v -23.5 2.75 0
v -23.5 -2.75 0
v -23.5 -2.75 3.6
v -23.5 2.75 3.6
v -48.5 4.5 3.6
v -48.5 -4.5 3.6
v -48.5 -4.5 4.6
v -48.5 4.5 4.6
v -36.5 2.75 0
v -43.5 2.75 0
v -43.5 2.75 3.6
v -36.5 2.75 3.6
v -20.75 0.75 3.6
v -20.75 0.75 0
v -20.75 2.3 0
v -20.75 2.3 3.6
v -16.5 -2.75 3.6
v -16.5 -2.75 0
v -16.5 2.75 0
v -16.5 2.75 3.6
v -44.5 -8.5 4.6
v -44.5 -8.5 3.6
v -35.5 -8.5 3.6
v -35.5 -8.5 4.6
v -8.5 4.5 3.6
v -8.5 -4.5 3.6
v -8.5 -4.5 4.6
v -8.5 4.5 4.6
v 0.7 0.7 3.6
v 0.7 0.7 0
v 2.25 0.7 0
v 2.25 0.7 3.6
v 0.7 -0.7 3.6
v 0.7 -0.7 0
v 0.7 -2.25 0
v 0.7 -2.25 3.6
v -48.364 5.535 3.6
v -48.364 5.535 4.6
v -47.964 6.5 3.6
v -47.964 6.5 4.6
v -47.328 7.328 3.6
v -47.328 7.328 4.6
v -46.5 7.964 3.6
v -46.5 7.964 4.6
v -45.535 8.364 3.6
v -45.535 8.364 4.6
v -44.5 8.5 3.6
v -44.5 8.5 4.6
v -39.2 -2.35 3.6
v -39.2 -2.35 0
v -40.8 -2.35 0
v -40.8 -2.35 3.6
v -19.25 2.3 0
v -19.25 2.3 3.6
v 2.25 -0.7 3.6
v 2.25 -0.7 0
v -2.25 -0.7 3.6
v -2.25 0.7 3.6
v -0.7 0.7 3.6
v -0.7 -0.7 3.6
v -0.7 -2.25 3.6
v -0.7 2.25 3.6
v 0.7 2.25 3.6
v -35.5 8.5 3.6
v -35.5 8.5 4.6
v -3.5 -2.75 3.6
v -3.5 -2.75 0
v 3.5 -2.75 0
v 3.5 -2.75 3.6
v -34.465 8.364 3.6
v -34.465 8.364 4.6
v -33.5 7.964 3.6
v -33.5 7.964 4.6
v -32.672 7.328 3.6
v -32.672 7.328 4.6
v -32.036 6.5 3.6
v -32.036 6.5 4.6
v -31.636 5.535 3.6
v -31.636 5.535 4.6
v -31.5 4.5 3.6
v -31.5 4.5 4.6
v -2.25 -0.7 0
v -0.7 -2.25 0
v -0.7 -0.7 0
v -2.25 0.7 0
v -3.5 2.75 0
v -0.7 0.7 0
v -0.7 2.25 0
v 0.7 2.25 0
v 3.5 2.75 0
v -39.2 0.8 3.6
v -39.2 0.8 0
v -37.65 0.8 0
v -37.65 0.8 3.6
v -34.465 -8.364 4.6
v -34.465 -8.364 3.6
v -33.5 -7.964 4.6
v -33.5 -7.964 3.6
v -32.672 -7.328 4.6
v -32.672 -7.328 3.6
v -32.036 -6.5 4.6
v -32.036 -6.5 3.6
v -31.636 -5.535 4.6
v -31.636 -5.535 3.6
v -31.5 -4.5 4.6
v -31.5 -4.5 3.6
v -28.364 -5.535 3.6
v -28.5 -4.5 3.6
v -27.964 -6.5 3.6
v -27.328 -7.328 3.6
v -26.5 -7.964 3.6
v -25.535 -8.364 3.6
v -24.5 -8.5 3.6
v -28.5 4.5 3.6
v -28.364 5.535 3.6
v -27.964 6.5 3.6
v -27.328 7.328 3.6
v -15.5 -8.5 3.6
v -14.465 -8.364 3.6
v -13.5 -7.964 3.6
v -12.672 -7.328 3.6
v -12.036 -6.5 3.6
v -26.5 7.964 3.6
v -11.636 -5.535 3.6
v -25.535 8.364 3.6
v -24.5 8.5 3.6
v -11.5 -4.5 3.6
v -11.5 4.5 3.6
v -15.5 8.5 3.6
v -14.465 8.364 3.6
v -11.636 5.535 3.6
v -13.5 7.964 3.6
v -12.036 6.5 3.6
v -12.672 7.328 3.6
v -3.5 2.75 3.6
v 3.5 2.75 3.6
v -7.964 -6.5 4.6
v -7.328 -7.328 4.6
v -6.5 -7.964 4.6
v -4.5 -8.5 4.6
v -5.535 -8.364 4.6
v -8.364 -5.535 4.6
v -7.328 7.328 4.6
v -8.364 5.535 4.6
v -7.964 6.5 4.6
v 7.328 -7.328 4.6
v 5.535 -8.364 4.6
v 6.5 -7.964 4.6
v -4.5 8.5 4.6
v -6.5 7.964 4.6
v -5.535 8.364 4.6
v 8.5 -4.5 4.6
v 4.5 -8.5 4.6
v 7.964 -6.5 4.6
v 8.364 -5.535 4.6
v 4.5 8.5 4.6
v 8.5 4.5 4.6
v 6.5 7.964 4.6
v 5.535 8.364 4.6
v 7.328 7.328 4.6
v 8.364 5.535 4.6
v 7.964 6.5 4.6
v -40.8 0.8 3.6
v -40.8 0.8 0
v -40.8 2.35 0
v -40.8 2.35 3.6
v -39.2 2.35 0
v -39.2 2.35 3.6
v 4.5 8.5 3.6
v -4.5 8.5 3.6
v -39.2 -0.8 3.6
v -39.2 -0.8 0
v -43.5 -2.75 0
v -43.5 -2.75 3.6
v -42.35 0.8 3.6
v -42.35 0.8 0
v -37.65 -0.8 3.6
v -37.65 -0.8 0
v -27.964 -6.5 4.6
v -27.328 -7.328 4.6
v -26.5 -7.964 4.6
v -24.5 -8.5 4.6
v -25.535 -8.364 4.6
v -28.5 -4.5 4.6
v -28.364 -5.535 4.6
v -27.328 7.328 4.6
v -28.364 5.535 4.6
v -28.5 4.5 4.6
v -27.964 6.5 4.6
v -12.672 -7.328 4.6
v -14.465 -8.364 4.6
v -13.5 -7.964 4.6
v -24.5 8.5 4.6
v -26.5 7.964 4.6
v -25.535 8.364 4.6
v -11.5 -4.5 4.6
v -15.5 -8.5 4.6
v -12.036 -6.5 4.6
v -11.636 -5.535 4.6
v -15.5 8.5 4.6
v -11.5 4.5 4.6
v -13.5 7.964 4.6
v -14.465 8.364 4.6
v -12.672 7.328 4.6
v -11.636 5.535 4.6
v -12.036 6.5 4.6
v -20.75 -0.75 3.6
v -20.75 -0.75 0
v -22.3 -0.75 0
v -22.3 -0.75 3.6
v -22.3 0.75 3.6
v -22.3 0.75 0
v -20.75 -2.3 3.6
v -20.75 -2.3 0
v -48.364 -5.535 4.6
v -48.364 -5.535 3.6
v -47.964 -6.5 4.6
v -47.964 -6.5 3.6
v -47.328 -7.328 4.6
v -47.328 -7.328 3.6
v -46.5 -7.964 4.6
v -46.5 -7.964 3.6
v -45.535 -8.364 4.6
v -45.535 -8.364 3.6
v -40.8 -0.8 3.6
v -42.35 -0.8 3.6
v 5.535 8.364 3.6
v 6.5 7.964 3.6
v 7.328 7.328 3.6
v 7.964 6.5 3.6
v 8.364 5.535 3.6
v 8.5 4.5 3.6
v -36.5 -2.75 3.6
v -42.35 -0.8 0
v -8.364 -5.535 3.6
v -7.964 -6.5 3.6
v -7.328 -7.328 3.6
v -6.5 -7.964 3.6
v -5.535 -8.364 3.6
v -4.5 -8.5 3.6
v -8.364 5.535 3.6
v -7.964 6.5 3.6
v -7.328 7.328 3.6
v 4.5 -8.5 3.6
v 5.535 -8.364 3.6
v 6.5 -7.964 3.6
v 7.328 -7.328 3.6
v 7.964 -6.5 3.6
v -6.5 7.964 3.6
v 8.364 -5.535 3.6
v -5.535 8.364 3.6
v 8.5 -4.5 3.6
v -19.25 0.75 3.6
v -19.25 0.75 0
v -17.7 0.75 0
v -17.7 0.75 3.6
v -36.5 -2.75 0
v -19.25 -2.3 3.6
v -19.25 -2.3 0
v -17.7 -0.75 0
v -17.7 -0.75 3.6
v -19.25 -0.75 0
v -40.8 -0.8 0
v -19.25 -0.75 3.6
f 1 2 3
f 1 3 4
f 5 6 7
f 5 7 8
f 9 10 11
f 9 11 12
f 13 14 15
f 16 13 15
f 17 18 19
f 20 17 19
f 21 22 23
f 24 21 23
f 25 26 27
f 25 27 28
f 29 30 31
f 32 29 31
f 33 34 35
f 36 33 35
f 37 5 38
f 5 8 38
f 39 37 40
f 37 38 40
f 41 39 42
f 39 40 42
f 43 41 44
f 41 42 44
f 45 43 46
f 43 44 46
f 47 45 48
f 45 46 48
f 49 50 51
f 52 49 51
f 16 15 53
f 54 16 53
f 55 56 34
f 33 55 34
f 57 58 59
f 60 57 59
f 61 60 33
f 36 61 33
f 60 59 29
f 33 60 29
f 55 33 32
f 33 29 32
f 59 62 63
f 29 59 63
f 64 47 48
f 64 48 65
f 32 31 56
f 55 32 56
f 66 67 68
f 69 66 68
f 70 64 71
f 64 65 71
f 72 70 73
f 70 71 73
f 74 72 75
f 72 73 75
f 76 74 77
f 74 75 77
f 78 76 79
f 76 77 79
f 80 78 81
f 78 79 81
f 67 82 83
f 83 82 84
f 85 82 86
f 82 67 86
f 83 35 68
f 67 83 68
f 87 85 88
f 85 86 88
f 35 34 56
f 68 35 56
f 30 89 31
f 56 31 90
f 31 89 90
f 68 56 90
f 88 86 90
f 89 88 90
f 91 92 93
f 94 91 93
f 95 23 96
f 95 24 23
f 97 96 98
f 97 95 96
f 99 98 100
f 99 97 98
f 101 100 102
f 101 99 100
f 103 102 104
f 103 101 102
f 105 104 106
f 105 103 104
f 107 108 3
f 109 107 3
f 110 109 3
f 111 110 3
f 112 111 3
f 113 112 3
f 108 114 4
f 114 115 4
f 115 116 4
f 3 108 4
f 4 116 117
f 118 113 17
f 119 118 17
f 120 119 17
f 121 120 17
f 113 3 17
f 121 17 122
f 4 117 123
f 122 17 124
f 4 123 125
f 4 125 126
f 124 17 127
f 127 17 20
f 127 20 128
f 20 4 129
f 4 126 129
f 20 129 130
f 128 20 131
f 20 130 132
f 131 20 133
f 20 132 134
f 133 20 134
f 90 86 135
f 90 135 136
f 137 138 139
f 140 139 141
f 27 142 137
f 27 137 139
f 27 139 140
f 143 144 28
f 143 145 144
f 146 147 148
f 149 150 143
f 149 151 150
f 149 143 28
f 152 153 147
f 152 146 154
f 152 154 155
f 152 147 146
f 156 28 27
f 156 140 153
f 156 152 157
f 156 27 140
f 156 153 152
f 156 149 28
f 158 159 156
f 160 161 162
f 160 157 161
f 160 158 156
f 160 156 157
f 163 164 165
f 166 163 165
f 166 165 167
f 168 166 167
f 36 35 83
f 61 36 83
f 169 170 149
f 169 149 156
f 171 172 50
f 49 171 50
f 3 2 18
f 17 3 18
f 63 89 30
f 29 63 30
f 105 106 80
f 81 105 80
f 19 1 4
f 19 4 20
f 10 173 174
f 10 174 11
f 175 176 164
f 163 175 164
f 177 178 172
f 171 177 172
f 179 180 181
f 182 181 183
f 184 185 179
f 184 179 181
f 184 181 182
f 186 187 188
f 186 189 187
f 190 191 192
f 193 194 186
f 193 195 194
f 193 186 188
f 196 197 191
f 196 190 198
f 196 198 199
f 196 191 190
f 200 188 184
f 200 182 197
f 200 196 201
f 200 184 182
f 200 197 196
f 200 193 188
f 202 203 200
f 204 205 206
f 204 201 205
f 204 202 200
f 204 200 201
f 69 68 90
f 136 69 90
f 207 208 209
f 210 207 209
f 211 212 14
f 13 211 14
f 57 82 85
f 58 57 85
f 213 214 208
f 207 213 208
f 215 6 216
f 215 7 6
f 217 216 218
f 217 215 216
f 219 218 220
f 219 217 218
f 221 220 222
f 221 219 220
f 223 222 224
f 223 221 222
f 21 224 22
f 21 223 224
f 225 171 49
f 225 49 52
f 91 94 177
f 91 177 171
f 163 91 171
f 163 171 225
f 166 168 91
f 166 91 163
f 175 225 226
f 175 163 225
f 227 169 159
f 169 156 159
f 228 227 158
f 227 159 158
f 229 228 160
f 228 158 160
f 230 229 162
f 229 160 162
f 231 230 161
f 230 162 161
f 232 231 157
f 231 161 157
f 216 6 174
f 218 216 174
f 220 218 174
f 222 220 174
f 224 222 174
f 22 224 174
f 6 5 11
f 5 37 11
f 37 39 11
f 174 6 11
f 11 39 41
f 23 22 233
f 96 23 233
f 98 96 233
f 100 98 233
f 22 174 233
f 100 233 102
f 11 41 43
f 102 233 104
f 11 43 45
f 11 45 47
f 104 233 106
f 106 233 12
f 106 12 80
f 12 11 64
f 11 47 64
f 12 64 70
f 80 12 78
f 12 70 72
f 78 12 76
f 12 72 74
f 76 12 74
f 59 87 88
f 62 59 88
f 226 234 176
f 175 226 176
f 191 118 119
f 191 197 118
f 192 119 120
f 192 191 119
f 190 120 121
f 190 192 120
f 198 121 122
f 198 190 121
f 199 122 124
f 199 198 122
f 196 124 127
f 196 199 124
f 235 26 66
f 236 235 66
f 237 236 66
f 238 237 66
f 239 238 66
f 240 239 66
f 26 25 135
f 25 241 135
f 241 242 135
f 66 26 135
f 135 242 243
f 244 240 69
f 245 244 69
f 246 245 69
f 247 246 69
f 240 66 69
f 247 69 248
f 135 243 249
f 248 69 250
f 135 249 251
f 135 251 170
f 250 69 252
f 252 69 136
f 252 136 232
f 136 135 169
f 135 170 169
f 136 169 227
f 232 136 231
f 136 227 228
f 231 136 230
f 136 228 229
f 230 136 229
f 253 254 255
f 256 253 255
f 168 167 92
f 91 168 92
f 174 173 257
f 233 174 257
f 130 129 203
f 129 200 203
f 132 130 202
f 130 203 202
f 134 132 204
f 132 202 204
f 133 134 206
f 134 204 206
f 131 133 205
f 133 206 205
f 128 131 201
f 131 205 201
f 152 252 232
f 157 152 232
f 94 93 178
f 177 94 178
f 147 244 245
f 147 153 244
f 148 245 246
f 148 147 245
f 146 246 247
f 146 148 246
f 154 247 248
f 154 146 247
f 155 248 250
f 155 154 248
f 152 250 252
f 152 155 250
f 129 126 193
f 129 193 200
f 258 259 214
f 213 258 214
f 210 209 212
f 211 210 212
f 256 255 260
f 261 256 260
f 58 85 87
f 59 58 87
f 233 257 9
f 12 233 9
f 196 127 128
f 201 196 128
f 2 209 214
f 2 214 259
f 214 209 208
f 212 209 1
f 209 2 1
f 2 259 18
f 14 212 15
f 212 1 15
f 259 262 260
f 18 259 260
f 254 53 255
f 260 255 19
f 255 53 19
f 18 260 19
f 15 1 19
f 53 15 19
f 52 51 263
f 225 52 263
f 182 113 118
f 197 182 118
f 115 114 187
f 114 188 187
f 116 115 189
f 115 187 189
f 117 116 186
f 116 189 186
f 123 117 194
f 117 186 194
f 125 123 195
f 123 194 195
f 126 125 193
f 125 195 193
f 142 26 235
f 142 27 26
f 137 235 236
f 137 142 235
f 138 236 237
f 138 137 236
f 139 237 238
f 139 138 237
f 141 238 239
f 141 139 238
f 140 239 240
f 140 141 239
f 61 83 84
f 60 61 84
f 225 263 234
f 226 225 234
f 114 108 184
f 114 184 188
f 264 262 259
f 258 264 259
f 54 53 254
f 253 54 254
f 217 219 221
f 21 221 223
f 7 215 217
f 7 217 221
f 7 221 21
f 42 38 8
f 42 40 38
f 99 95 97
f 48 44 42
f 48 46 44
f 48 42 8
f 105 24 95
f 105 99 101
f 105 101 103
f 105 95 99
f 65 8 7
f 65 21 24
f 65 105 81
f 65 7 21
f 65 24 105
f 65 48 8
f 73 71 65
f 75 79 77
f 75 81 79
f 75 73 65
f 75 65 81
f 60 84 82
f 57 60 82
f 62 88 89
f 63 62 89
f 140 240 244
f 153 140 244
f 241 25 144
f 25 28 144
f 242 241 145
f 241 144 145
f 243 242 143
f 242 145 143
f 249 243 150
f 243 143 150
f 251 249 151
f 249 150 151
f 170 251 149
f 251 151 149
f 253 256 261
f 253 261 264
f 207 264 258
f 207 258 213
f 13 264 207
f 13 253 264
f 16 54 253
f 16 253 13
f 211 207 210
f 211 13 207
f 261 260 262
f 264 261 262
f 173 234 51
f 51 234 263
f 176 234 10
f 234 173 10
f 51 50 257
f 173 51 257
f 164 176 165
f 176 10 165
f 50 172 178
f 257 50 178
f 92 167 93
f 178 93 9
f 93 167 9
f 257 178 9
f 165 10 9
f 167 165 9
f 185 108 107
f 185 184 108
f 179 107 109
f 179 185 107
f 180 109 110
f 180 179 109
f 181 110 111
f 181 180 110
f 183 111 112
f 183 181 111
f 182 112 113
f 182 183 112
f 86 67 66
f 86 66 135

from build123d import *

# Parameters (mm, degrees)
SKICA1_W                 = 7
SKICA1_H                 = 5.5
P_IDAT_VYSUNUT_M1_DEPTH  = 3.6
SKICA2_W                 = 17
SKICA2_H                 = 17
P_IDAT_VYSUNUT_M2_DEPTH  = 1
ZAOBLIT1_R               = 4
LINPOLE1_COUNT           = 3
LINPOLE1_PITCH           = 20
ODEBRAT_VYSUNUT_M1_DEPTH = 3.6


with BuildPart() as part:
    # Skica1 → Přidat vysunutím1 (new body)
    with BuildSketch(Plane.XY):
        Rectangle(SKICA1_W, SKICA1_H)
        Polygon((-0.7, 0.7), (-0.7, 2.25), (0.7, 2.25), (0.7, 0.7), (2.25, 0.7), (2.25, -0.7), (0.7, -0.7), (0.7, -2.25), (-0.7, -2.25), (-0.7, -0.7), (-2.25, -0.7), (-2.25, 0.7), align=None, mode=Mode.SUBTRACT)
    extrude(amount=P_IDAT_VYSUNUT_M1_DEPTH)

    # Skica2 → Přidat vysunutím2 (add)
    with BuildSketch(Plane.XY.offset(3.6)):
        Rectangle(SKICA2_W, SKICA2_H)
    extrude(amount=P_IDAT_VYSUNUT_M2_DEPTH)

    # Zaoblit1
    zaoblit1_edges = [part.edges().sort_by_distance(p)[0] for p in [
        (8.5, -8.5, 4.1),
        (8.5, 8.5, 4.1),
        (-8.5, 8.5, 4.1),
        (-8.5, -8.5, 4.1),
    ]]
    fillet(zaoblit1_edges, radius=ZAOBLIT1_R)


with BuildPart() as linpole1_1:
    # LinPole1: pattern copy
    add(part.part.moved(Location(Vector(-1, 0, 0) * (1 * LINPOLE1_PITCH))))


with BuildPart() as linpole1_2:
    # LinPole1: pattern copy
    add(part.part.moved(Location(Vector(-1, 0, 0) * (2 * LINPOLE1_PITCH))))


with BuildPart() as odebrat_vysunut_m1_tool:
    # Skica4 → Odebrat vysunutím1 (new body)
    with BuildSketch(Plane(origin=(0, 0, 0), x_dir=(-1, 0, 0), z_dir=(0, 0, -1))):
        Polygon((19.25, 2.3), (19.25, 0.75), (17.7, 0.75), (17.7, -0.75), (19.25, -0.75), (19.25, -2.3), (20.75, -2.3), (20.75, -0.75), (22.3, -0.75), (22.3, 0.75), (20.75, 0.75), (20.75, 2.3), align=None)
        Polygon((39.2, 2.35), (39.2, 0.8), (37.65, 0.8), (37.65, -0.8), (39.2, -0.8), (39.2, -2.35), (40.8, -2.35), (40.8, -0.8), (42.35, -0.8), (42.35, 0.8), (40.8, 0.8), (40.8, 2.35), align=None)
    extrude(amount=-ODEBRAT_VYSUNUT_M1_DEPTH)


with BuildPart() as linpole1_1_1:
    add(linpole1_1.part)

    # Odebrat vysunutím1: cut by odebrat_vysunut_m1_tool
    add(odebrat_vysunut_m1_tool.part, mode=Mode.SUBTRACT)


with BuildPart() as linpole1_2_1:
    add(linpole1_2.part)

    # Odebrat vysunutím1: cut by odebrat_vysunut_m1_tool
    add(odebrat_vysunut_m1_tool.part, mode=Mode.SUBTRACT)


solid = Compound([part.part, linpole1_1_1.part, linpole1_2_1.part])
